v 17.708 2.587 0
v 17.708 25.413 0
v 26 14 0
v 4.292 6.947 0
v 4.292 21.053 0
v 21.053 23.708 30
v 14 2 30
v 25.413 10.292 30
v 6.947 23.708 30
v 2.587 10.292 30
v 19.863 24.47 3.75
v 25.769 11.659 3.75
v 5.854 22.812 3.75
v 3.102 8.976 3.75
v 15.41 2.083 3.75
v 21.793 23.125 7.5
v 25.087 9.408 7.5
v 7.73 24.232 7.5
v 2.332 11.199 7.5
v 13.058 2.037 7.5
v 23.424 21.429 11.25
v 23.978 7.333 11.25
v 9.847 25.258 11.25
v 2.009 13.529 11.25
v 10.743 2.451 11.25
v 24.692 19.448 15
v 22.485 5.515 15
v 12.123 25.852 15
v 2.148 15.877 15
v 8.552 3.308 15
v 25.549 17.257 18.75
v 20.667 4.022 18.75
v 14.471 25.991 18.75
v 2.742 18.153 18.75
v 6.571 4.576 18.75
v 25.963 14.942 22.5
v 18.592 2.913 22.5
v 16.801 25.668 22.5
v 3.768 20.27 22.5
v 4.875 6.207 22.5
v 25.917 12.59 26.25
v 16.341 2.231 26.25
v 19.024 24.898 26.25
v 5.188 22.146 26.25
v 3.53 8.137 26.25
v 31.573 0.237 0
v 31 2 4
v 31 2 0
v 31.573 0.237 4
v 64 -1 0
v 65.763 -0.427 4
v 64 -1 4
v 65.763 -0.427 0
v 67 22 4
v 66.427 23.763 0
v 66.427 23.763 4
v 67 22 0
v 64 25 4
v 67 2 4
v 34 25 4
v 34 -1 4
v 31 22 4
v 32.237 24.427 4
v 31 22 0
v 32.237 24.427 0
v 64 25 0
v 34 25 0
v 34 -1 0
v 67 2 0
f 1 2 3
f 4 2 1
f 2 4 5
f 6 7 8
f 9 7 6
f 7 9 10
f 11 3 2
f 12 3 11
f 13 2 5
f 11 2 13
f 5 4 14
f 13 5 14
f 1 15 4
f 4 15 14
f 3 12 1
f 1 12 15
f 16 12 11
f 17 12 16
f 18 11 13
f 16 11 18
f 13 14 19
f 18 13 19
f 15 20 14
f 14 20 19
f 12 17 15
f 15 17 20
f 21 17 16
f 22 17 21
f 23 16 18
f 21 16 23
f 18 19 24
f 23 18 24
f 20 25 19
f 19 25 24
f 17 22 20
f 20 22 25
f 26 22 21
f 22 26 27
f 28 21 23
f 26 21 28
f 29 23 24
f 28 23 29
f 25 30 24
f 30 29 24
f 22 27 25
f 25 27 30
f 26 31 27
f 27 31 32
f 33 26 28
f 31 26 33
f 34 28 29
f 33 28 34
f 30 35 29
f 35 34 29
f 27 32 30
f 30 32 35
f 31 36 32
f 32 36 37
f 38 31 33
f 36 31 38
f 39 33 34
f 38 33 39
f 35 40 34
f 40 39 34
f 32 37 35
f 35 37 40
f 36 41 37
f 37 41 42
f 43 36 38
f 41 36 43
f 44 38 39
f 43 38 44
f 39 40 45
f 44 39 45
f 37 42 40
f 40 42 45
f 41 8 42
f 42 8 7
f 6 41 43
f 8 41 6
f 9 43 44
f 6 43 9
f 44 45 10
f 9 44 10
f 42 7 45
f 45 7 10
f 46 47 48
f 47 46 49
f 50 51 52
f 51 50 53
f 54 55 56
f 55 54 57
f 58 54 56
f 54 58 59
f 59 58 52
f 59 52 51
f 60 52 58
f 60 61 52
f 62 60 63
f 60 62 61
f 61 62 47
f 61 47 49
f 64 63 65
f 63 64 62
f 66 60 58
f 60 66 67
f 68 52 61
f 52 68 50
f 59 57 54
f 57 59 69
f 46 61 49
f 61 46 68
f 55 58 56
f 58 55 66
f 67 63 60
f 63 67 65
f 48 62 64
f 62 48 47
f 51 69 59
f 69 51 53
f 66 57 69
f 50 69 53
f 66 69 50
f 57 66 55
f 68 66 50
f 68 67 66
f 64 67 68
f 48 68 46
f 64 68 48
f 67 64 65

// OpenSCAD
// flat.scad — 2D shapes that become solids (chapter 7).
// On the left, a pentagon prism that twists as it rises:
// linear_extrude() with twist rotates the flat shape
// between its bottom and its top, around the 2D origin —
// so the profile is drawn centred on the origin first,
// extruded, and only then moved as a finished solid.
// (Draw it off-centre instead and the twist swings it
// around the axis like a bucket on a rope.)
//
// On the right, a square whose corners were rounded by
// offset() before extruding: offset grows (or shrinks) a
// 2D outline by a fixed distance, the easy way to round
// flat corners.

// A five-sided prism, twisted a quarter turn over 30.
translate([14, 14, 0])
    linear_extrude(height = 30, twist = 90)
        circle(r = 12, $fn = 5);

// A 30 x 20 plate with 3-radius corners, 4 thick:
// offset adds the radius on every side, so the finished
// plate is 36 x 26.
translate([34, 2, 0])
    linear_extrude(height = 4)
        offset(r = 3)
            square([30, 20]);
